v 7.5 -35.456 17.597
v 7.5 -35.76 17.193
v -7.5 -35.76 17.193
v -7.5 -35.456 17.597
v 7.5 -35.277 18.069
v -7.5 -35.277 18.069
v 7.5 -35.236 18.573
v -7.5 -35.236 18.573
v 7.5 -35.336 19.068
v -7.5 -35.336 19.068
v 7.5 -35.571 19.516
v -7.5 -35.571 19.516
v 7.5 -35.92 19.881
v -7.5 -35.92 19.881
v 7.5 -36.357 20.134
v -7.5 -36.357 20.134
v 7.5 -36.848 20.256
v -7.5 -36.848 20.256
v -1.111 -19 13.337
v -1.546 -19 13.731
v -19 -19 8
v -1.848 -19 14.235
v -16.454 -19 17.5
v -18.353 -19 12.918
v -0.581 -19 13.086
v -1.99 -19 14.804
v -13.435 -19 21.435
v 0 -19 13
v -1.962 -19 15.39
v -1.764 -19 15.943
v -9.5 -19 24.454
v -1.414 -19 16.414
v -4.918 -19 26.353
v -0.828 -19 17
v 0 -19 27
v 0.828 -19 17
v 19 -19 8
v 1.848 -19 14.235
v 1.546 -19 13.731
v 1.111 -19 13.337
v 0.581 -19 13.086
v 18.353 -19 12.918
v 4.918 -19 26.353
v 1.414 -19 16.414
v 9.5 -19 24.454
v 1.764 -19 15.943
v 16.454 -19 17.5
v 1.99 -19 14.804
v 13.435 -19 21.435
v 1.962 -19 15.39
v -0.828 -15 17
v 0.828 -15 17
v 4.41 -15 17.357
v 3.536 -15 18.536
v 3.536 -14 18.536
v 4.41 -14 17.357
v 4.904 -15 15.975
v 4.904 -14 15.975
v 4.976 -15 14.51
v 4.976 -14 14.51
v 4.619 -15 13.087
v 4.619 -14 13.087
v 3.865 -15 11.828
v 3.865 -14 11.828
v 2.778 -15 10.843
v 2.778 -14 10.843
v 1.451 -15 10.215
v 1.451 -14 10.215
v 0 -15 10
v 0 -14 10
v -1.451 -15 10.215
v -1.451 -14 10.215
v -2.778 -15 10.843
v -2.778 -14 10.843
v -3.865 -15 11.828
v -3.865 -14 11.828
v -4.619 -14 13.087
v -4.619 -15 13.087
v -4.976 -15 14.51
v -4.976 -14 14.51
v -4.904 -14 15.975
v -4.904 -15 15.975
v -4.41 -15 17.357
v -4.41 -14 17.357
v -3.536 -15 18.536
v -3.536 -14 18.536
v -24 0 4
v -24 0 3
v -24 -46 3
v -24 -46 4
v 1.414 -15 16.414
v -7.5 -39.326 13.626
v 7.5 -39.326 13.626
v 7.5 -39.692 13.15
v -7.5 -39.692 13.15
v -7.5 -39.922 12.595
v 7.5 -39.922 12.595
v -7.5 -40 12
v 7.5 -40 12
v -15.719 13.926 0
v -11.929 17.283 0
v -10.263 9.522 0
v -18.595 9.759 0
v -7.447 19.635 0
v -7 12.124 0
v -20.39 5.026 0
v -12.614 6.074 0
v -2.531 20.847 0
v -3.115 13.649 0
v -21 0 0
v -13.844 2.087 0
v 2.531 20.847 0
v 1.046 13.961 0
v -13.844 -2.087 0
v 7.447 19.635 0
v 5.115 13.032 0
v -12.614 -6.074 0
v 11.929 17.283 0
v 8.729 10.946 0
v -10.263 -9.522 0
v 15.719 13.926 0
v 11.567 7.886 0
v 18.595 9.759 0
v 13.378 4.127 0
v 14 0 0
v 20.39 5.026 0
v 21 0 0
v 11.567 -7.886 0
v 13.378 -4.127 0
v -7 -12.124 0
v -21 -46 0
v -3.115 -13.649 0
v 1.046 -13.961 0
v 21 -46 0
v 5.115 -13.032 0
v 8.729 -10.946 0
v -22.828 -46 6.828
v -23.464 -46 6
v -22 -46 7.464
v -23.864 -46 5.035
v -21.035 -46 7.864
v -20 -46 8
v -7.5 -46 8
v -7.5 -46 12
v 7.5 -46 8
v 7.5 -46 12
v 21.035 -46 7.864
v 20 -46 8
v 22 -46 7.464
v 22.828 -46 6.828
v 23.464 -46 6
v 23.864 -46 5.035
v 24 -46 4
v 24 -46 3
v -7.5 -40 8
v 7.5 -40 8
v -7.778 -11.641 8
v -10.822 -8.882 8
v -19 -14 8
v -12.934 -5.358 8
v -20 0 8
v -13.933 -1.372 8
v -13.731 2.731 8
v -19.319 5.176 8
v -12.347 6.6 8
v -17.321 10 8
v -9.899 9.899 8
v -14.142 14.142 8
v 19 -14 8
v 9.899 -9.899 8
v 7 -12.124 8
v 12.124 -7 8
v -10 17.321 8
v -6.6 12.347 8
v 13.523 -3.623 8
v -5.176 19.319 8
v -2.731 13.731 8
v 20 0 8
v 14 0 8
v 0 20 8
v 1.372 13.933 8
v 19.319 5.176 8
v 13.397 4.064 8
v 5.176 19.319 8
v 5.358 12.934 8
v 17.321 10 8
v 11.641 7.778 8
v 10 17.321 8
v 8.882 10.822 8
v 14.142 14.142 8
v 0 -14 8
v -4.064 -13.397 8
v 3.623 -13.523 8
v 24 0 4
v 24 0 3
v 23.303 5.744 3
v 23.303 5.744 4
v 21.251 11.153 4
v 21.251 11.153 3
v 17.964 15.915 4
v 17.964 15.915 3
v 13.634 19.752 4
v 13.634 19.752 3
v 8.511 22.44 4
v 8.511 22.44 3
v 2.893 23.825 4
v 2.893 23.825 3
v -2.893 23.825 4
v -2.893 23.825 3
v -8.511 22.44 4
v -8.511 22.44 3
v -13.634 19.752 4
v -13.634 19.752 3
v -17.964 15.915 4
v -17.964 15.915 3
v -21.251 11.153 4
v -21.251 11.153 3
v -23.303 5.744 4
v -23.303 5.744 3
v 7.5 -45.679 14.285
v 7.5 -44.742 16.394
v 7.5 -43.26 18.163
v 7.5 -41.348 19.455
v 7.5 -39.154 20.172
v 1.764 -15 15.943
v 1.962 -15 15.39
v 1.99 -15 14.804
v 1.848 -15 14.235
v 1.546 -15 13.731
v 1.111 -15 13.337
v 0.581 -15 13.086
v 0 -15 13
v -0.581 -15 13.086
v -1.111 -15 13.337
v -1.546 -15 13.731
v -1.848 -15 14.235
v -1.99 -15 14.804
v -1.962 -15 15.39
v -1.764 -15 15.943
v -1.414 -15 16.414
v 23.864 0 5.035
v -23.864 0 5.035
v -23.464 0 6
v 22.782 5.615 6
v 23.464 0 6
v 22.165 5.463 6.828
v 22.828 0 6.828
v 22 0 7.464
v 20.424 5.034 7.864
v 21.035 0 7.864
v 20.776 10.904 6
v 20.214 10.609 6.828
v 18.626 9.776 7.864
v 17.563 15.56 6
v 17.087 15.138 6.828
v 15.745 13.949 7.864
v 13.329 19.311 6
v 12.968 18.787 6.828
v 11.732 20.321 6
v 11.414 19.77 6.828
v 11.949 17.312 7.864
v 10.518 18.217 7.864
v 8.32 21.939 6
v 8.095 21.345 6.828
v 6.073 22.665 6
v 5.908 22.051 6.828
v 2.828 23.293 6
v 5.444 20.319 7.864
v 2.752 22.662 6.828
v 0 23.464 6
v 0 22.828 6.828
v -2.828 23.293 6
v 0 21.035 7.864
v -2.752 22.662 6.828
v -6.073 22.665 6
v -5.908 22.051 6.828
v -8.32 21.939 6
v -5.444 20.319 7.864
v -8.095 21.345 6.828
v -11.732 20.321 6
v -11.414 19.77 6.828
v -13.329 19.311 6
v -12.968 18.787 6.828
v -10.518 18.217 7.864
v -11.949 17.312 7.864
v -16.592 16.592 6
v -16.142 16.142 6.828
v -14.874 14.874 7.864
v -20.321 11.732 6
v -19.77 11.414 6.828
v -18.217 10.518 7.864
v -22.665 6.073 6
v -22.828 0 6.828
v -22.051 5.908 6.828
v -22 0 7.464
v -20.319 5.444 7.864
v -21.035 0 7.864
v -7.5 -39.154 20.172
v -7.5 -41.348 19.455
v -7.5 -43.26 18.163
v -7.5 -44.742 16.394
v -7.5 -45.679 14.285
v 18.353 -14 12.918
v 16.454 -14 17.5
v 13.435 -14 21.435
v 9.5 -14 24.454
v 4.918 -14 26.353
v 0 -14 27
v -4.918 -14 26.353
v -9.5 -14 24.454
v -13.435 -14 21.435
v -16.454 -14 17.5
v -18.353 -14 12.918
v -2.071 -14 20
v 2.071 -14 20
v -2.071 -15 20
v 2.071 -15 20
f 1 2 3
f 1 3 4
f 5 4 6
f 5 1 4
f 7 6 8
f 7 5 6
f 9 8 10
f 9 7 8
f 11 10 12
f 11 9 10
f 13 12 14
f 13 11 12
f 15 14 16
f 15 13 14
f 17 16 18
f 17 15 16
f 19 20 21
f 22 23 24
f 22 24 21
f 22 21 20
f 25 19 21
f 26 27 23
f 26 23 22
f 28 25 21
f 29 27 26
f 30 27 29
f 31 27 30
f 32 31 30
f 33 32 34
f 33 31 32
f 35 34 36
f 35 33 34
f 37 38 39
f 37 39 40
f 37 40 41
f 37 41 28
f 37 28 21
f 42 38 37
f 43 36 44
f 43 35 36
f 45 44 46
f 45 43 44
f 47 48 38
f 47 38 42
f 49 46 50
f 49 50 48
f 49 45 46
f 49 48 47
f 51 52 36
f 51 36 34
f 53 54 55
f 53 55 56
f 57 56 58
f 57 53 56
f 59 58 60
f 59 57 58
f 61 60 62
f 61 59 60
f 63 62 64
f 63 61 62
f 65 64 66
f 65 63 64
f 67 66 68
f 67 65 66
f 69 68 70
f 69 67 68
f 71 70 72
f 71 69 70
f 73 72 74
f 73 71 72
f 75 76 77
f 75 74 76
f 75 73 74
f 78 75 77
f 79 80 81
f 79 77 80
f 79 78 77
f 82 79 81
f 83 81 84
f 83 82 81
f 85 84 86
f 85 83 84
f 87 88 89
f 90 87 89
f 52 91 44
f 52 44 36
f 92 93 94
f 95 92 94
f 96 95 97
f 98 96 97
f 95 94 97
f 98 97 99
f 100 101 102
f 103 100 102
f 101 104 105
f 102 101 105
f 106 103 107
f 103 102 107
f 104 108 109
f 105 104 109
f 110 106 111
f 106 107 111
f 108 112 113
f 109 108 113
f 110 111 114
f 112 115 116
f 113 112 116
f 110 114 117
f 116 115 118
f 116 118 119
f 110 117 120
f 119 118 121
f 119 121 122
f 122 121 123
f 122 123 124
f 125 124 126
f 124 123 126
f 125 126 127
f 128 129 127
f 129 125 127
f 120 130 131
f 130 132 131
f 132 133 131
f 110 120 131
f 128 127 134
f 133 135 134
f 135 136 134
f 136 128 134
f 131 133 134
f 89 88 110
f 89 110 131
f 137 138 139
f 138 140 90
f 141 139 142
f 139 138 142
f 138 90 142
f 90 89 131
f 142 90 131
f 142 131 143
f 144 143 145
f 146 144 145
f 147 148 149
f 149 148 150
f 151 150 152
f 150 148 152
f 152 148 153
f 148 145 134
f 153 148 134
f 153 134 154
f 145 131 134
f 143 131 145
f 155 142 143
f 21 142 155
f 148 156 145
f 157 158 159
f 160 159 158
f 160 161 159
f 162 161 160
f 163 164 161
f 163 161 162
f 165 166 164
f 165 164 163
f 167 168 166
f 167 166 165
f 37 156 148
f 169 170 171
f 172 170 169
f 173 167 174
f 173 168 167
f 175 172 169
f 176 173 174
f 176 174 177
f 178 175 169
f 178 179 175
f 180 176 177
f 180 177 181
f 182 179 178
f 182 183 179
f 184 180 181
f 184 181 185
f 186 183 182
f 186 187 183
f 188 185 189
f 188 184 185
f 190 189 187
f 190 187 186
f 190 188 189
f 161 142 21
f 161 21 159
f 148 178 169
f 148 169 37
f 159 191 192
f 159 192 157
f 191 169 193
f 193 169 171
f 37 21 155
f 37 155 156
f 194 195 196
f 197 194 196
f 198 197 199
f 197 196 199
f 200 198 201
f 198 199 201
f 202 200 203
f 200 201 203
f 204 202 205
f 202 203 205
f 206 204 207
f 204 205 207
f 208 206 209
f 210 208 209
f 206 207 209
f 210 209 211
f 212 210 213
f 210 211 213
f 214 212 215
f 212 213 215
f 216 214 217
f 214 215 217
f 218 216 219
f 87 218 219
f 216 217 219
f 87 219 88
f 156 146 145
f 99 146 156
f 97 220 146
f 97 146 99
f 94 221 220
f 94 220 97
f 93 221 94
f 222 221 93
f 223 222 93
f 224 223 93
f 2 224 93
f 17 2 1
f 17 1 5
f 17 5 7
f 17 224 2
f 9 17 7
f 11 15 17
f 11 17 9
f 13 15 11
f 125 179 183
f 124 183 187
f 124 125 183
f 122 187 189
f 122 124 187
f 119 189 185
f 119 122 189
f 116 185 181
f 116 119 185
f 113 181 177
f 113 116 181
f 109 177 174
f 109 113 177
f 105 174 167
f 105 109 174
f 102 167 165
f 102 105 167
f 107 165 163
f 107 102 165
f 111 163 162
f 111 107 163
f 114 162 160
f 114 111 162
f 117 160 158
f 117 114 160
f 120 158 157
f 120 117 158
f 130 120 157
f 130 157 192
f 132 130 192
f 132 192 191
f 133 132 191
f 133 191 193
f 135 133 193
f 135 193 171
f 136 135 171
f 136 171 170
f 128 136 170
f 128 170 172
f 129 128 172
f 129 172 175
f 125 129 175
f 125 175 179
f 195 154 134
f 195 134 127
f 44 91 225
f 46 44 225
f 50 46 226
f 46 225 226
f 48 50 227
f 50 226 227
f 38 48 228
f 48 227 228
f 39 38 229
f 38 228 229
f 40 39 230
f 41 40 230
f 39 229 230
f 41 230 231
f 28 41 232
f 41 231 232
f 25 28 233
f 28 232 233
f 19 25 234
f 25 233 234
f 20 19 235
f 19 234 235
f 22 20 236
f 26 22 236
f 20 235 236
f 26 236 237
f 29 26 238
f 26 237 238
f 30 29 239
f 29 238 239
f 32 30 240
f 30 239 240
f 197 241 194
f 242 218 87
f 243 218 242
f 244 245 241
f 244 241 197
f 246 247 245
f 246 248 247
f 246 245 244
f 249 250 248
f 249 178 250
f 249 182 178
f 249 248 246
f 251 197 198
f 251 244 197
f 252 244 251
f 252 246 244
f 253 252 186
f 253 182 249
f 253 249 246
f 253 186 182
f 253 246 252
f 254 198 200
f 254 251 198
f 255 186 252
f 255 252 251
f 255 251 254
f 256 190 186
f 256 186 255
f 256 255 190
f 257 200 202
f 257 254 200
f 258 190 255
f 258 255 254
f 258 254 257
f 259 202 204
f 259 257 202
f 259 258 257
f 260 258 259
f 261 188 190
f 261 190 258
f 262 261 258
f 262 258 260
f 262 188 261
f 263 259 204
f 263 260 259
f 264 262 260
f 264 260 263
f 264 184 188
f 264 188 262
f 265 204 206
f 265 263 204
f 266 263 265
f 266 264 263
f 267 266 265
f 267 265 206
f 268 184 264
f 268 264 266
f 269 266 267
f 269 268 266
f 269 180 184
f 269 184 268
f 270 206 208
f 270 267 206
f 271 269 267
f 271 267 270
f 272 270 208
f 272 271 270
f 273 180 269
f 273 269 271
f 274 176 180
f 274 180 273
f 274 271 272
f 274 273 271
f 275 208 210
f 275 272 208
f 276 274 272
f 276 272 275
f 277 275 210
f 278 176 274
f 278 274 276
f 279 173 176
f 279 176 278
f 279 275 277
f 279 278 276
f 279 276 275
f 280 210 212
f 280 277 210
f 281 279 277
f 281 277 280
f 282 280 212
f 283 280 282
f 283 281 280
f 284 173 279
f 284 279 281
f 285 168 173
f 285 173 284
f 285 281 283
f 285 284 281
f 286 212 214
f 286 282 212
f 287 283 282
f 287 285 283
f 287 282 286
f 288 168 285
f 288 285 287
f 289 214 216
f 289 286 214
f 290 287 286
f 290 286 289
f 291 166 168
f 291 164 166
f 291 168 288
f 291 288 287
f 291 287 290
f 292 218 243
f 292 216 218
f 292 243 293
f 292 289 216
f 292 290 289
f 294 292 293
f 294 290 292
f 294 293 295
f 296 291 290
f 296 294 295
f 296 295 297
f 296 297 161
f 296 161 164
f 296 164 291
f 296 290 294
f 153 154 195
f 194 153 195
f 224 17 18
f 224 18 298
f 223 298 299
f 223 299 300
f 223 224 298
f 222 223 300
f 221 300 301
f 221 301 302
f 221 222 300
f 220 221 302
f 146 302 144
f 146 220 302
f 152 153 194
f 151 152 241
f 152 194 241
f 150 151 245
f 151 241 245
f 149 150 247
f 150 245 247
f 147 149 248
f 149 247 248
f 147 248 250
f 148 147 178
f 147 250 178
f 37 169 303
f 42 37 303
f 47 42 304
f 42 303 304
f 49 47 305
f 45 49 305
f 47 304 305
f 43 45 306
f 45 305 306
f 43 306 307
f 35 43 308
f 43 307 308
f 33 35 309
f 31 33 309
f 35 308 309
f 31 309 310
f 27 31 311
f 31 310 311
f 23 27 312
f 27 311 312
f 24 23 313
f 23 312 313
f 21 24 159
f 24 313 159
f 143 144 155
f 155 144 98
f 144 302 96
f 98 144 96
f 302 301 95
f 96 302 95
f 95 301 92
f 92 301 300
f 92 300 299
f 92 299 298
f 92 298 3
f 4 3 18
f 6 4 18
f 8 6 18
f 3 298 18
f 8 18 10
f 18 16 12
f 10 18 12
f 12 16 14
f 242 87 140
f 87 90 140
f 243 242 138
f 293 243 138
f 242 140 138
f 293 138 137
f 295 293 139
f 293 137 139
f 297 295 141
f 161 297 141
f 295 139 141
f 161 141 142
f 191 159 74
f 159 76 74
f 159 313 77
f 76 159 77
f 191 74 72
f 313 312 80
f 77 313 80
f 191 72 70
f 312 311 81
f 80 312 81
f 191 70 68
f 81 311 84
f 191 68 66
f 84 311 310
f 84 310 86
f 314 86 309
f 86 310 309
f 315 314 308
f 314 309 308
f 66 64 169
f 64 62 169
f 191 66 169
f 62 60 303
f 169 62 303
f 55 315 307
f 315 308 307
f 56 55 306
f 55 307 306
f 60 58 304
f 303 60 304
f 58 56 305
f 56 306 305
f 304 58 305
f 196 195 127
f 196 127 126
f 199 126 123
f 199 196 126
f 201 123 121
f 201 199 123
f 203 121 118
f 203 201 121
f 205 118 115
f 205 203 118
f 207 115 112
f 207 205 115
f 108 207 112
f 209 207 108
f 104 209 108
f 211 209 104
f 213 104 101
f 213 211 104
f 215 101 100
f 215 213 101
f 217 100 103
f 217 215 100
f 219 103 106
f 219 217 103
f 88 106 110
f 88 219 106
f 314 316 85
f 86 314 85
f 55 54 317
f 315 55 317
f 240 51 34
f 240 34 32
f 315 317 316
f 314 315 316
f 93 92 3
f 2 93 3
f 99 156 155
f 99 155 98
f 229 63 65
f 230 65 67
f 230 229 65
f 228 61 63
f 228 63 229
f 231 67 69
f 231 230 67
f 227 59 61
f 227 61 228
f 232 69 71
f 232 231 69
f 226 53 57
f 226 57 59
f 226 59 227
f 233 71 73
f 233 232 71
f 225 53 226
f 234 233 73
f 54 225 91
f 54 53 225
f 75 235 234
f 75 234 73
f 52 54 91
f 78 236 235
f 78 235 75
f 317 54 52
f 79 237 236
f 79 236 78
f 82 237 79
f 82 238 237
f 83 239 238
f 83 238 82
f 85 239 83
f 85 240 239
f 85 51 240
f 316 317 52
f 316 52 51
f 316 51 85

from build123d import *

# Parameters (mm, degrees)
PAD004_DEPTH          = 7.5
PAD003_DEPTH          = 10
PAD002_DEPTH          = 20
CLONE_ROLL_ANGLE      = 90
CLONE_PLACEMENT_ANGLE = 180
SKETCH_R              = 14
PAD_DEPTH             = 8
FILLET_R              = 4
CHAMFER_SIZE          = 3
PAD001_DEPTH          = 5


with BuildPart() as hookpad001:
    # Sketch004 → Pad004 (new body, symmetric)
    with BuildSketch(Plane.YZ):
        with BuildLine():
            Line((-40, 0), (-40, 12))
            ThreePointArc((-39.326335, 13.626354), (-39.82492, 12.880177), (-40, 12))
            Line((-39.326335, 13.626354), (-35.759843, 17.192846))
            ThreePointArc((-35.759843, 17.192846), (-35.336431, 19.068073), (-36.847811, 20.256133))
            ThreePointArc((-36.847811, 20.256133), (-43.259533, 18.162919), (-46, 12))
            Line((-46, 0), (-46, 12))
            Line((-40, 0), (-46, 0))
        make_face()
    extrude(amount=PAD004_DEPTH, both=True)


with BuildPart() as printbolthead001:
    # Sketch003 → Pad003 (new body)
    with BuildSketch(Plane.XY):
        with BuildLine():
            ThreePointArc((-3.535526, 3.535542), (-1.8e-05, -5), (3.535551, 3.535517))
            Line((2.071068, 5), (3.535551, 3.535517))
            Line((-2.071068, 5), (2.071068, 5))
            Line((-3.535526, 3.535542), (-2.071068, 5))
        make_face()
    extrude(amount=PAD003_DEPTH)


with BuildPart() as clone_of_printboltslot:
    # Sketch002 → Pad002 (new body)
    with BuildSketch(Plane.XY):
        with BuildLine():
            ThreePointArc((-1.414208, 1.414219), (1e-06, -2), (1.414206, 1.414221))
            Line((0.828427, 2), (1.414206, 1.414221))
            Line((-0.828427, 2), (0.828427, 2))
            Line((-1.414208, 1.414219), (-0.828427, 2))
        make_face()
    extrude(amount=-PAD002_DEPTH)

    # Fusion001: union PrintBoltHead001
    add(printbolthead001.part)


with BuildPart() as clone_of_printboltslot_1:
    # Clone roll: moved
    add(clone_of_printboltslot.part.rotate(Axis((0, 0, 0), (1, 0, 0)), CLONE_ROLL_ANGLE))


with BuildPart() as clone_of_printboltslot_2:
    # Clone placement: moved
    add(clone_of_printboltslot_1.part.moved(Location((0, -15, 15))).rotate(Axis((0, -15, 15), (0, 0, 1)), CLONE_PLACEMENT_ANGLE))


with BuildPart() as mainchamfer:
    # Sketch → Pad (new body)
    with BuildSketch(Plane.XY):
        with BuildLine():
            Line((-24, -1e-06), (-24, -46))
            Line((-24, -46), (24, -46))
            Line((24, -46), (24, -1e-06))
            ThreePointArc((24, -1e-06), (0, 24), (-24, -1e-06))
        make_face()
        Circle(SKETCH_R, mode=Mode.SUBTRACT)
    extrude(amount=PAD_DEPTH)

    # Fillet
    fillet_edges = [mainchamfer.edges().sort_by_distance(p)[0] for p in [
        (24, -23, 8),
    ]]
    fillet(fillet_edges, radius=FILLET_R)

    # Chamfer
    chamfer_edges = [mainchamfer.edges().sort_by_distance(p)[0] for p in [
        (24, -23, 0),
    ]]
    chamfer(chamfer_edges, length=CHAMFER_SIZE)


with BuildPart() as hook:
    # Sketch001 → Pad001 (new body)
    with BuildSketch(Plane(origin=(0, -14, 8), x_dir=(1, 0, 0), z_dir=(0, -1, 0))):
        with BuildLine():
            ThreePointArc((19, 0), (0, 19), (-19, 0))
            Line((-19, 0), (19, 0))
        make_face()
    extrude(amount=PAD001_DEPTH)

    # Fusion: union MainChamfer
    add(mainchamfer.part)

    # Cut: cut Clone of PrintBoltSlot
    add(clone_of_printboltslot_2.part, mode=Mode.SUBTRACT)

    # Fusion002: union HookPad001
    add(hookpad001.part)


solid = hook.part
